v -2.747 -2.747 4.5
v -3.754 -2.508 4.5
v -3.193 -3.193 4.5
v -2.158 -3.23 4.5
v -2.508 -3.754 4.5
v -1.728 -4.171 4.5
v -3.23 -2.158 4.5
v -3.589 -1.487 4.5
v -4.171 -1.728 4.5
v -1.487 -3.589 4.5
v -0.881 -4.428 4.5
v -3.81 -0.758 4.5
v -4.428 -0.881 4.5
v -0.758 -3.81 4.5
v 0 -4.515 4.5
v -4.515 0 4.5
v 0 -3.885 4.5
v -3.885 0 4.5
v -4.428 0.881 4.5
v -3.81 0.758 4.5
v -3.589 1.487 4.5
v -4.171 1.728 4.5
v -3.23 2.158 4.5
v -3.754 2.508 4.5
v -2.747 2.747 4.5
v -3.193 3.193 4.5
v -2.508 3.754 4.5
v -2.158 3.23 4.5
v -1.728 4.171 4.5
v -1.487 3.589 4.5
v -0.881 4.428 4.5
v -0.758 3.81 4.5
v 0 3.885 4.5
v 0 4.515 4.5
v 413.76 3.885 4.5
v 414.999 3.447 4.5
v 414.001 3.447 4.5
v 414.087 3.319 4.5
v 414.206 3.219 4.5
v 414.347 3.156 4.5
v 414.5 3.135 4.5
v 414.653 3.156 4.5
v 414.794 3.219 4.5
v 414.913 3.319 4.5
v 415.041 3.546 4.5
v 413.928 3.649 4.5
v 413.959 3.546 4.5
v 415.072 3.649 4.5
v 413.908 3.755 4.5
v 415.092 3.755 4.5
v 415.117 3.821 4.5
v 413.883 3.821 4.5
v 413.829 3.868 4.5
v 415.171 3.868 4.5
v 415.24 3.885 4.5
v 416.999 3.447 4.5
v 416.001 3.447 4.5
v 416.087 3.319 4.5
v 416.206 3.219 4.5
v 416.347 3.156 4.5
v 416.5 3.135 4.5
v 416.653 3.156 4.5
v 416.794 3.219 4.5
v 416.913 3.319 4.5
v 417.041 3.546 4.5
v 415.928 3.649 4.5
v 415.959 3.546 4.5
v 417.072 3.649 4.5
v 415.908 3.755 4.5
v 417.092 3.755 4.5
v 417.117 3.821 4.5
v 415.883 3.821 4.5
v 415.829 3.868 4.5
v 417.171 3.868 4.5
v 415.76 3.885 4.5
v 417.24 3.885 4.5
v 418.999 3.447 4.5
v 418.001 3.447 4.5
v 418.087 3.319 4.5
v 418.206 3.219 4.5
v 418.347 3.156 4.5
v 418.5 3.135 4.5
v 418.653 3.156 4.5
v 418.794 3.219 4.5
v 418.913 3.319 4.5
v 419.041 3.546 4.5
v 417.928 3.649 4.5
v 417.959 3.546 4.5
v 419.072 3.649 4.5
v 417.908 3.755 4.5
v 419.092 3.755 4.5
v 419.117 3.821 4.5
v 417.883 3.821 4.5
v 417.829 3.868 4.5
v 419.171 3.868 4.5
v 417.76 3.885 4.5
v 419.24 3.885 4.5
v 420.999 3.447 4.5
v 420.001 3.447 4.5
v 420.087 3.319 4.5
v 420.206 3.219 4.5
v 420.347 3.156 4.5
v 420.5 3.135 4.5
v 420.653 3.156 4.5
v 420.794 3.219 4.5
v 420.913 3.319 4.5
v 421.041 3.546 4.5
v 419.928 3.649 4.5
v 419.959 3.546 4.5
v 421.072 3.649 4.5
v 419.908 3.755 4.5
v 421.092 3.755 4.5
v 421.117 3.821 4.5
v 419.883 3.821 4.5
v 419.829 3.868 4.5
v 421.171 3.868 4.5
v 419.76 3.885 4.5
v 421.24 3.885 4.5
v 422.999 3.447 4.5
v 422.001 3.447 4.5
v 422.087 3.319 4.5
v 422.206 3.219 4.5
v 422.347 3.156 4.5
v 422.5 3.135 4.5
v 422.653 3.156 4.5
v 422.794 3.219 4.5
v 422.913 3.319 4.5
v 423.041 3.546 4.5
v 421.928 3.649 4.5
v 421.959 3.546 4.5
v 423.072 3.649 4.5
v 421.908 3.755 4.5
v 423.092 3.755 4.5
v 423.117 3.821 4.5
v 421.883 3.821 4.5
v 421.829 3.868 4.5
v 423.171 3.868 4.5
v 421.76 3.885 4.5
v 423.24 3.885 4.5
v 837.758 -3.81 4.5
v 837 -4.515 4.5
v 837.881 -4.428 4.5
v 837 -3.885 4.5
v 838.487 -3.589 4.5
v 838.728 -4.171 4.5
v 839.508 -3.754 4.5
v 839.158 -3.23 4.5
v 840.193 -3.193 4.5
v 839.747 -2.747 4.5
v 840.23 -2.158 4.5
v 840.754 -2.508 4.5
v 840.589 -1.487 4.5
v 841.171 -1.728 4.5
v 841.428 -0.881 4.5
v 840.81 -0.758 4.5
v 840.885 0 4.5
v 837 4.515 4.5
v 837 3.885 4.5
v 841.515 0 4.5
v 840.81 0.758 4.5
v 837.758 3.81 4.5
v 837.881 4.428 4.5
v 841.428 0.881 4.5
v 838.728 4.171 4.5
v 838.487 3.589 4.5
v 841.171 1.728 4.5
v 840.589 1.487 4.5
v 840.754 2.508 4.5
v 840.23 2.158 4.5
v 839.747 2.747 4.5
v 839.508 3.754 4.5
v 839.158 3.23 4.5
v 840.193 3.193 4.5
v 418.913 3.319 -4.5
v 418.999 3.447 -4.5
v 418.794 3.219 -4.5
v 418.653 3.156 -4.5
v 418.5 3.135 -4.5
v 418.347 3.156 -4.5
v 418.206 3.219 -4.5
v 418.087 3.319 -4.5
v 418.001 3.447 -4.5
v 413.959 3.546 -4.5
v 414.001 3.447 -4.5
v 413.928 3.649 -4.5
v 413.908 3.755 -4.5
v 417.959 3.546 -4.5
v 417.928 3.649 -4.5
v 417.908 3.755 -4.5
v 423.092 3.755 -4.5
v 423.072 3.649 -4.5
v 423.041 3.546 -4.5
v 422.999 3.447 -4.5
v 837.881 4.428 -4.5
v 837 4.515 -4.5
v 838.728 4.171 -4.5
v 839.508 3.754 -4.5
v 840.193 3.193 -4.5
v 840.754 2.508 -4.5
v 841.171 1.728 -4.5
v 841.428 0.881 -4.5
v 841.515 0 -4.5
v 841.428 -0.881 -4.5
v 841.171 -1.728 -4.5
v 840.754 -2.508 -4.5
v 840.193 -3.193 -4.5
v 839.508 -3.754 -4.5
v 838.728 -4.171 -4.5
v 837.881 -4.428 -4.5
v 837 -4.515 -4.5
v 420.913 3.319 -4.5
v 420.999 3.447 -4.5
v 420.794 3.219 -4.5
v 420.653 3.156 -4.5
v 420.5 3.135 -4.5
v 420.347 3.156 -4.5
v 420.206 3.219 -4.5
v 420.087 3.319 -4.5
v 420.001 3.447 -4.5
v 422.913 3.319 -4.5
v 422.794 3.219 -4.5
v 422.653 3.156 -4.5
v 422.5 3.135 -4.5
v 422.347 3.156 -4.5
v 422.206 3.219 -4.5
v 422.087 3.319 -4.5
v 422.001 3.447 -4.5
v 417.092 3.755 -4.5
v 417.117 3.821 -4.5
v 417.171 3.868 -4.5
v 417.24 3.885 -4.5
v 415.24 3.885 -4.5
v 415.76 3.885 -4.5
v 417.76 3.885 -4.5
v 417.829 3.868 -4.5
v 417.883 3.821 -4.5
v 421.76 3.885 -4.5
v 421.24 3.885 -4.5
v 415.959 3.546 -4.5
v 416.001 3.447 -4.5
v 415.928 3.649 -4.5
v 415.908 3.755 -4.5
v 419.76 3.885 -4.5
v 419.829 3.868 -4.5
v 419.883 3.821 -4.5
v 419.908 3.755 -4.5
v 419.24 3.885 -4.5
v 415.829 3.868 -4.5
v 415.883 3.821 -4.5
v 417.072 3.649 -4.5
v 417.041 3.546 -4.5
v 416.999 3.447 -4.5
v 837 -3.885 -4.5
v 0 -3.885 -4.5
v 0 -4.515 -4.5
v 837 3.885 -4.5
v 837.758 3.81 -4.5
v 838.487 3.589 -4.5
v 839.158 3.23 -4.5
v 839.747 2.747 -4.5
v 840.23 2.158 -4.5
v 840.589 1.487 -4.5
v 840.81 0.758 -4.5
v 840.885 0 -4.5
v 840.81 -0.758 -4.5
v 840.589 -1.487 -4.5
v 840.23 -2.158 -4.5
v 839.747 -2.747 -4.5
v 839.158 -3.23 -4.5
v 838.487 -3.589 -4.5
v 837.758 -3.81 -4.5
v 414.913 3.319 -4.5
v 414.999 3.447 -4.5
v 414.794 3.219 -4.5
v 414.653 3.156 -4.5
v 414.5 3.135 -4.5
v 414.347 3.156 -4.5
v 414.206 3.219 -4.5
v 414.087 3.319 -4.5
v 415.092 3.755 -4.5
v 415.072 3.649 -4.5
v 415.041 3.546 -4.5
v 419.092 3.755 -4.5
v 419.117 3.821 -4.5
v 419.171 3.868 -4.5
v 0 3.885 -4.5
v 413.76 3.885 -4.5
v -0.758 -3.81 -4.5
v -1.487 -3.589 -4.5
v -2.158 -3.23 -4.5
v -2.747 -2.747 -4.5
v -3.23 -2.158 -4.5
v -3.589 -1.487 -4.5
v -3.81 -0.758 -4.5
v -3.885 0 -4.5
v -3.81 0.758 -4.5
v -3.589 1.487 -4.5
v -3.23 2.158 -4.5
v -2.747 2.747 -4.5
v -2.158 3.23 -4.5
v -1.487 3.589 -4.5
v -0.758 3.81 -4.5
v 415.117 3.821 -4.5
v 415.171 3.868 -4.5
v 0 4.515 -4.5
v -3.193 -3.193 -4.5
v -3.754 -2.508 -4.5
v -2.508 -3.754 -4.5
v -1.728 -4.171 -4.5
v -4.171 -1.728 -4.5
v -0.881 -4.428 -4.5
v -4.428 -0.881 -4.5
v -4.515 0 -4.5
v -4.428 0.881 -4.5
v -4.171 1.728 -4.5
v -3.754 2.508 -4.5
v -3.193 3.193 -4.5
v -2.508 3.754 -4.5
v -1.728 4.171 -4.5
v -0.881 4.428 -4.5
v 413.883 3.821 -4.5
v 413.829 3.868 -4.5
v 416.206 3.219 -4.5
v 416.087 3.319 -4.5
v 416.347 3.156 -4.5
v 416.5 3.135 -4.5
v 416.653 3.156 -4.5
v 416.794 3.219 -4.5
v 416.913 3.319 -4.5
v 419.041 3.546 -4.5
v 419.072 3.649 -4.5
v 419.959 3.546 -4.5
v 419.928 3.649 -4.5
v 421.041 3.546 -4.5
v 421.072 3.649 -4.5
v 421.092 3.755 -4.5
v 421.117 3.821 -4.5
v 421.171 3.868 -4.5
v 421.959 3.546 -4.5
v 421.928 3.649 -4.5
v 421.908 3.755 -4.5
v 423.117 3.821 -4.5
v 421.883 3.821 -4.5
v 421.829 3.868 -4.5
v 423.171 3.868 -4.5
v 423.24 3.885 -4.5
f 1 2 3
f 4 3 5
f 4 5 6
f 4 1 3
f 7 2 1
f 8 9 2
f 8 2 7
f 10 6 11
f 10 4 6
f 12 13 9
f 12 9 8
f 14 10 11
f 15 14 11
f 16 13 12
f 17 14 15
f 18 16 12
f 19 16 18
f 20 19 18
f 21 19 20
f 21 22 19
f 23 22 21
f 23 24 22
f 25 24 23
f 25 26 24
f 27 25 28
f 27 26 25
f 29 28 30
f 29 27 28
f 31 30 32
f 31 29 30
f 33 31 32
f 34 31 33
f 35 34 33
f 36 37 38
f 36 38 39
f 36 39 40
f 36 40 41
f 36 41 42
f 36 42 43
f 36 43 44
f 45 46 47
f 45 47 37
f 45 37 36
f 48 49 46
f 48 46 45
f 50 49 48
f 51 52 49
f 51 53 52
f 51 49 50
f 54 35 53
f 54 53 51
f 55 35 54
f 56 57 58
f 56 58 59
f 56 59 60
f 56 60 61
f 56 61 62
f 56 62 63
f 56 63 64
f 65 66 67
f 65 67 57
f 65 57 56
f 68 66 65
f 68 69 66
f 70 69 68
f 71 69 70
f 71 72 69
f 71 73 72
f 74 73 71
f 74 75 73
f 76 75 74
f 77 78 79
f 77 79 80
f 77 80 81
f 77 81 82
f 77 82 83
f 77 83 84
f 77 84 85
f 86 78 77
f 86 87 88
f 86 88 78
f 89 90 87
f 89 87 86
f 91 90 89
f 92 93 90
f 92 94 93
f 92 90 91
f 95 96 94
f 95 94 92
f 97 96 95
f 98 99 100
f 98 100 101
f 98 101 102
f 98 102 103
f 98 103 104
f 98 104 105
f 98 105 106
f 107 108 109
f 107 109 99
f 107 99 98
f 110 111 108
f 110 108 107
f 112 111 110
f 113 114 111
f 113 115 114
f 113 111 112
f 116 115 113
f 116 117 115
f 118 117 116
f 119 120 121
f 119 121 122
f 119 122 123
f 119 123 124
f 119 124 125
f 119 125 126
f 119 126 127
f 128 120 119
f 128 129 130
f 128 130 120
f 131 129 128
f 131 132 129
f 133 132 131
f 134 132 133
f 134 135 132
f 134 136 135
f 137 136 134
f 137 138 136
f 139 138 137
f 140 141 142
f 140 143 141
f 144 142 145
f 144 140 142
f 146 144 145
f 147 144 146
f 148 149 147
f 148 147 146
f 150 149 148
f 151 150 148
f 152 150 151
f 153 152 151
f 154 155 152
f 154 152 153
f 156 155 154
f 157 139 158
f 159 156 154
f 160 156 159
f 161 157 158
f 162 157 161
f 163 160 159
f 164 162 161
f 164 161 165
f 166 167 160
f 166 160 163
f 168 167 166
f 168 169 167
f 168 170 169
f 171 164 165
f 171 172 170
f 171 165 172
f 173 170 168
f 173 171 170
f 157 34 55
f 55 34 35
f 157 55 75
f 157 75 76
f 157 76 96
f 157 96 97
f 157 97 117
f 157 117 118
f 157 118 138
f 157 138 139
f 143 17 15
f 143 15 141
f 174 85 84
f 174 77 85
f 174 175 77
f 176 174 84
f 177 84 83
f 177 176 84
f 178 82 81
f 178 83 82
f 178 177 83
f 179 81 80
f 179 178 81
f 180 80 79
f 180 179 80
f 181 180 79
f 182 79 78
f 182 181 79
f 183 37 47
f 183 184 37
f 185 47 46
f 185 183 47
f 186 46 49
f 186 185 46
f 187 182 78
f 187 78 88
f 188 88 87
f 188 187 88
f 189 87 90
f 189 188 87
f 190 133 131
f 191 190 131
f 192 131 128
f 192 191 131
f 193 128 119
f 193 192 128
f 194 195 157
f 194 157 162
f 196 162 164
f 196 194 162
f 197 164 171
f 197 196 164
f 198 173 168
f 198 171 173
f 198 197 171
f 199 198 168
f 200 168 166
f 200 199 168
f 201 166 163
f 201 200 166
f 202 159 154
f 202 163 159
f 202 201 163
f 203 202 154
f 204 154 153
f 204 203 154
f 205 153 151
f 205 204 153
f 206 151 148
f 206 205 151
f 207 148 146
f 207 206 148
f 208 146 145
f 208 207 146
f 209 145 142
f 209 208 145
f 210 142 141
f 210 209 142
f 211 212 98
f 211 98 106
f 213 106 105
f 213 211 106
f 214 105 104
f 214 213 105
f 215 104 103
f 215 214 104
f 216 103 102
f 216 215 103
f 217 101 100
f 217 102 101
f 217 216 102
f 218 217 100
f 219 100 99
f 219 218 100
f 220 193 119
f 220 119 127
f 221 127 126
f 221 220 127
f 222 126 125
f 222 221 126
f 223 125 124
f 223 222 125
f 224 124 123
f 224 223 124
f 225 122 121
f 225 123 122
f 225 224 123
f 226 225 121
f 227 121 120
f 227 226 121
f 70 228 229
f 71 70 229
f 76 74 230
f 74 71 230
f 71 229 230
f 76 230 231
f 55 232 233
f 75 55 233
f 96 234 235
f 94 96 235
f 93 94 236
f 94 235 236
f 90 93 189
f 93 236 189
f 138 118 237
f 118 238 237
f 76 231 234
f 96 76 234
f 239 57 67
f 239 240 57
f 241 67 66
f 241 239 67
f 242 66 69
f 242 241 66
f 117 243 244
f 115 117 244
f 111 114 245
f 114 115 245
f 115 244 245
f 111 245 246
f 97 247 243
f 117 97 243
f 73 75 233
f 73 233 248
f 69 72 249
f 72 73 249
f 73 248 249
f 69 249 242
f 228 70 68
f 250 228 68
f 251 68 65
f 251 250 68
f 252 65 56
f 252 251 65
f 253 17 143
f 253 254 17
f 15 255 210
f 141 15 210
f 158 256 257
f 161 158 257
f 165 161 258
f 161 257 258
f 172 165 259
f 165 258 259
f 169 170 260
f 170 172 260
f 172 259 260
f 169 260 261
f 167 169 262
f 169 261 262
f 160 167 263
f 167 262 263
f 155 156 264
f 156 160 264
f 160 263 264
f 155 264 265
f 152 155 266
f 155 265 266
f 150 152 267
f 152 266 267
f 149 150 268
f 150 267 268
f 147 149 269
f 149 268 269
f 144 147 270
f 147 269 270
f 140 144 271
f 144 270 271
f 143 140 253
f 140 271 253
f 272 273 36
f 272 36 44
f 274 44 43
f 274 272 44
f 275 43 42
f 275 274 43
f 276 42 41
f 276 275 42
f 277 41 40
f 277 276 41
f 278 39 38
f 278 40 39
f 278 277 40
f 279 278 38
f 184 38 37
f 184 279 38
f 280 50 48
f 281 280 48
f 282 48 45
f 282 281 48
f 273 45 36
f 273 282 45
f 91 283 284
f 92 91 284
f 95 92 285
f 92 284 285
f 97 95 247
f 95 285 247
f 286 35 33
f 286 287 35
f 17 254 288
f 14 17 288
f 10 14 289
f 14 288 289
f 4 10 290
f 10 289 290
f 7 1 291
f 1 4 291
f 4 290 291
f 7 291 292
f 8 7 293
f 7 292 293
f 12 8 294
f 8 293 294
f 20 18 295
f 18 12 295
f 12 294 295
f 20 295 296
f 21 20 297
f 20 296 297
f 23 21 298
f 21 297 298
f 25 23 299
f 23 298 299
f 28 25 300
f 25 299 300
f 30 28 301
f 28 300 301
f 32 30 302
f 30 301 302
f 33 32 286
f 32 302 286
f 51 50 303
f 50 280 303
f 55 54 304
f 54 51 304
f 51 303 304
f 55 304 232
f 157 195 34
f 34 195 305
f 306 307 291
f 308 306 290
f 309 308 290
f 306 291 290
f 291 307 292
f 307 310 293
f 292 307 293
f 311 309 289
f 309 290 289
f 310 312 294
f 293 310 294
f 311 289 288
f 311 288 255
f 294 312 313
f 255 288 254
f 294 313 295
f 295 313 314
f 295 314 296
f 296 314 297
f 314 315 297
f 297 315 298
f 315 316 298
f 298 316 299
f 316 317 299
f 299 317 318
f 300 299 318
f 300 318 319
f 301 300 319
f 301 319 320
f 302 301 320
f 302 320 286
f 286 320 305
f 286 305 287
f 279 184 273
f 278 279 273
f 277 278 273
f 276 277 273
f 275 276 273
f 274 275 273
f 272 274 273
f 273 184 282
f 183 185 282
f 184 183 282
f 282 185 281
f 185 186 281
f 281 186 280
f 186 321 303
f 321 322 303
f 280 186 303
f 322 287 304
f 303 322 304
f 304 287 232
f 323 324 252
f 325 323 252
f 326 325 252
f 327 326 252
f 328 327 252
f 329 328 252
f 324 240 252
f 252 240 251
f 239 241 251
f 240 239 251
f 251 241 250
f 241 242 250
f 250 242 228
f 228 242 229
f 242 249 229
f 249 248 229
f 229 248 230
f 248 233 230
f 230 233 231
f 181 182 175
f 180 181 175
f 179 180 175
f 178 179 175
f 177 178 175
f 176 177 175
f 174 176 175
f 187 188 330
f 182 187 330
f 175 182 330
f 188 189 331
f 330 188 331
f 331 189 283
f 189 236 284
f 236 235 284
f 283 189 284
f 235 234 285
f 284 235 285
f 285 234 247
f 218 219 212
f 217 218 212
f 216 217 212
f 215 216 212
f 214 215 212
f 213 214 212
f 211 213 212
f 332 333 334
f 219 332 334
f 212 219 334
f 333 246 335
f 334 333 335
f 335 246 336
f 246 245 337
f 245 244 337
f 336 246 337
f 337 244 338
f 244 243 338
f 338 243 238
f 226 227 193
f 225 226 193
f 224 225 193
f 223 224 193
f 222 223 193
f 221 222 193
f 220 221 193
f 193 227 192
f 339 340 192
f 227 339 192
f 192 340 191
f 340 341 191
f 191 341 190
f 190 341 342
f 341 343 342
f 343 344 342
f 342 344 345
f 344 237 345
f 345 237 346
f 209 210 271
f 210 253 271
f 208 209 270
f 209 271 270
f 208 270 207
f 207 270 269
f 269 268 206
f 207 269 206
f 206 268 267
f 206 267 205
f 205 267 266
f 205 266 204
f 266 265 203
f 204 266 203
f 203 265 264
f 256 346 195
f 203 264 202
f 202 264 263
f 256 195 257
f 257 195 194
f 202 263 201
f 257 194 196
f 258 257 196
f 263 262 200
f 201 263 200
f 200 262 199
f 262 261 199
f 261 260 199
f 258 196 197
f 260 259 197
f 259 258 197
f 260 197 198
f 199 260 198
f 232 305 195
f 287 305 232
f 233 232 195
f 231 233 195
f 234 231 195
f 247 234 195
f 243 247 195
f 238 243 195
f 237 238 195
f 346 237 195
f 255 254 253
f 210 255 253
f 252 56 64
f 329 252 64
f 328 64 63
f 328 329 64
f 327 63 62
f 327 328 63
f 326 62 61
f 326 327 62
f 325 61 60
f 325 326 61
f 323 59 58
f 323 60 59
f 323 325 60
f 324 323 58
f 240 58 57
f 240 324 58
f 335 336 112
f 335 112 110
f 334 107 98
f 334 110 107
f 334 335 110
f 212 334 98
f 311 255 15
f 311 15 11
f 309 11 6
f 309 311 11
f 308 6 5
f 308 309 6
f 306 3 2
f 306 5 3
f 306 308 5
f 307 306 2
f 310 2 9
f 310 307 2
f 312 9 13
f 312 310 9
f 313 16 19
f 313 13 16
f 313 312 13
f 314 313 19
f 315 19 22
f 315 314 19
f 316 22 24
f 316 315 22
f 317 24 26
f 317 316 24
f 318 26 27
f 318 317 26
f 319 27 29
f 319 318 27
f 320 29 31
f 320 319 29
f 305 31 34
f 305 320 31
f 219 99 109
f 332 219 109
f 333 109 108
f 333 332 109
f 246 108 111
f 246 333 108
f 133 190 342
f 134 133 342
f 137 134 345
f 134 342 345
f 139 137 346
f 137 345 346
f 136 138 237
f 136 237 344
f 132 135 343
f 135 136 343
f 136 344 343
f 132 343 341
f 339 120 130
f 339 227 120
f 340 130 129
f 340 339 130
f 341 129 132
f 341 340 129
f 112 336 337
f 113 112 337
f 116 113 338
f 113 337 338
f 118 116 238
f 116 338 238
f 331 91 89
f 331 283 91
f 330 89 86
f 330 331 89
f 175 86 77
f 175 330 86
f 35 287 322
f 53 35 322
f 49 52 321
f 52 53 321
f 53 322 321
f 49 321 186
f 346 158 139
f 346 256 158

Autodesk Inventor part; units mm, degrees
ref_plane "YZ Plane" through (0, 0, 0) normal (1, 0, 0) x (0, 1, 0)
ref_plane "XZ Plane" through (0, 0, 0) normal (0, 1, 0) x (-1, 0, 0)
ref_plane "XY Plane" through (0, 0, 0) normal (0, 0, 1) x (1, 0, 0)
sketch "_____1" plane through (0, 0, 0) normal (0, 0, 1) x (1, 0, 0)
  arc A0 (0, 4.515) -> (0, -4.515) centre (0, 0) ccw
  line L0 (0, -4.515) -> (837, -4.515)
  arc A1 (837, -4.515) -> (837, 4.515) centre (837, 0) ccw
  line L1 (837, 4.515) -> (0, 4.515)
  arc A2 (0, 3.885) -> (0, -3.885) centre (0, 0) ccw
  line L2 (0, -3.885) -> (837, -3.885)
  arc A3 (837, -3.885) -> (837, 3.885) centre (837, 0) ccw
  line L3 (837, 3.885) -> (0, 3.885)
extrude "Extrusion1" add sketch "_____1" along normal mid plane 9
sketch "_____2" plane through (0, 0, 0) normal (0, 0, 1) x (1, 0, 0)
  line L0 (413.5, 4.515) -> (413.5, 3.885)
  line L1 (413.5, 3.885) -> (413.7598, 3.885)
  arc A0 (413.9085, 3.7546) -> (413.7598, 3.885) centre (413.7598, 3.735) ccw
  arc A1 (413.9085, 3.7546) -> (414.0011, 3.4468) centre (414.9, 3.885) ccw
  arc A2 (414.0011, 3.4468) -> (414.9989, 3.4468) centre (414.5, 3.69) ccw
  arc A3 (414.9989, 3.4468) -> (415.0915, 3.7546) centre (414.1, 3.885) ccw
  arc A4 (415.2402, 3.885) -> (415.0915, 3.7546) centre (415.2402, 3.735) ccw
  line L2 (415.2402, 3.885) -> (415.7598, 3.885)
  arc A5 (415.9085, 3.7546) -> (415.7598, 3.885) centre (415.7598, 3.735) ccw
  arc A6 (415.9085, 3.7546) -> (416.0011, 3.4468) centre (416.9, 3.885) ccw
  arc A7 (416.0011, 3.4468) -> (416.9989, 3.4468) centre (416.5, 3.69) ccw
  arc A8 (416.9989, 3.4468) -> (417.0915, 3.7546) centre (416.1, 3.885) ccw
  arc A9 (417.2402, 3.885) -> (417.0915, 3.7546) centre (417.2402, 3.735) ccw
  line L3 (417.2402, 3.885) -> (417.7598, 3.885)
  arc A10 (417.9085, 3.7546) -> (417.7598, 3.885) centre (417.7598, 3.735) ccw
  arc A11 (417.9085, 3.7546) -> (418.0011, 3.4468) centre (418.9, 3.885) ccw
  arc A12 (418.0011, 3.4468) -> (418.9989, 3.4468) centre (418.5, 3.69) ccw
  arc A13 (418.9989, 3.4468) -> (419.0915, 3.7546) centre (418.1, 3.885) ccw
  arc A14 (419.2402, 3.885) -> (419.0915, 3.7546) centre (419.2402, 3.735) ccw
  line L4 (419.2402, 3.885) -> (419.7598, 3.885)
  arc A15 (419.9085, 3.7546) -> (419.7598, 3.885) centre (419.7598, 3.735) ccw
  arc A16 (419.9085, 3.7546) -> (420.0011, 3.4468) centre (420.9, 3.885) ccw
  arc A17 (420.0011, 3.4468) -> (420.9989, 3.4468) centre (420.5, 3.69) ccw
  arc A18 (420.9989, 3.4468) -> (421.0915, 3.7546) centre (420.1, 3.885) ccw
  arc A19 (421.2402, 3.885) -> (421.0915, 3.7546) centre (421.2402, 3.735) ccw
  line L5 (421.2402, 3.885) -> (421.7598, 3.885)
  arc A20 (421.9085, 3.7546) -> (421.7598, 3.885) centre (421.7598, 3.735) ccw
  arc A21 (421.9085, 3.7546) -> (422.0011, 3.4468) centre (422.9, 3.885) ccw
  arc A22 (422.0011, 3.4468) -> (422.9989, 3.4468) centre (422.5, 3.69) ccw
  arc A23 (422.9989, 3.4468) -> (423.0915, 3.7546) centre (422.1, 3.885) ccw
  arc A24 (423.2402, 3.885) -> (423.0915, 3.7546) centre (423.2402, 3.735) ccw
  line L6 (423.2402, 3.885) -> (423.5, 3.885)
  line L7 (423.5, 3.885) -> (423.5, 4.515)
  line L8 (423.5, 4.515) -> (413.5, 4.515)
extrude "Extrusion2" add sketch "_____2" along normal mid plane 9
properties part number "GBN1700MR2-90_info-1-13-13"
